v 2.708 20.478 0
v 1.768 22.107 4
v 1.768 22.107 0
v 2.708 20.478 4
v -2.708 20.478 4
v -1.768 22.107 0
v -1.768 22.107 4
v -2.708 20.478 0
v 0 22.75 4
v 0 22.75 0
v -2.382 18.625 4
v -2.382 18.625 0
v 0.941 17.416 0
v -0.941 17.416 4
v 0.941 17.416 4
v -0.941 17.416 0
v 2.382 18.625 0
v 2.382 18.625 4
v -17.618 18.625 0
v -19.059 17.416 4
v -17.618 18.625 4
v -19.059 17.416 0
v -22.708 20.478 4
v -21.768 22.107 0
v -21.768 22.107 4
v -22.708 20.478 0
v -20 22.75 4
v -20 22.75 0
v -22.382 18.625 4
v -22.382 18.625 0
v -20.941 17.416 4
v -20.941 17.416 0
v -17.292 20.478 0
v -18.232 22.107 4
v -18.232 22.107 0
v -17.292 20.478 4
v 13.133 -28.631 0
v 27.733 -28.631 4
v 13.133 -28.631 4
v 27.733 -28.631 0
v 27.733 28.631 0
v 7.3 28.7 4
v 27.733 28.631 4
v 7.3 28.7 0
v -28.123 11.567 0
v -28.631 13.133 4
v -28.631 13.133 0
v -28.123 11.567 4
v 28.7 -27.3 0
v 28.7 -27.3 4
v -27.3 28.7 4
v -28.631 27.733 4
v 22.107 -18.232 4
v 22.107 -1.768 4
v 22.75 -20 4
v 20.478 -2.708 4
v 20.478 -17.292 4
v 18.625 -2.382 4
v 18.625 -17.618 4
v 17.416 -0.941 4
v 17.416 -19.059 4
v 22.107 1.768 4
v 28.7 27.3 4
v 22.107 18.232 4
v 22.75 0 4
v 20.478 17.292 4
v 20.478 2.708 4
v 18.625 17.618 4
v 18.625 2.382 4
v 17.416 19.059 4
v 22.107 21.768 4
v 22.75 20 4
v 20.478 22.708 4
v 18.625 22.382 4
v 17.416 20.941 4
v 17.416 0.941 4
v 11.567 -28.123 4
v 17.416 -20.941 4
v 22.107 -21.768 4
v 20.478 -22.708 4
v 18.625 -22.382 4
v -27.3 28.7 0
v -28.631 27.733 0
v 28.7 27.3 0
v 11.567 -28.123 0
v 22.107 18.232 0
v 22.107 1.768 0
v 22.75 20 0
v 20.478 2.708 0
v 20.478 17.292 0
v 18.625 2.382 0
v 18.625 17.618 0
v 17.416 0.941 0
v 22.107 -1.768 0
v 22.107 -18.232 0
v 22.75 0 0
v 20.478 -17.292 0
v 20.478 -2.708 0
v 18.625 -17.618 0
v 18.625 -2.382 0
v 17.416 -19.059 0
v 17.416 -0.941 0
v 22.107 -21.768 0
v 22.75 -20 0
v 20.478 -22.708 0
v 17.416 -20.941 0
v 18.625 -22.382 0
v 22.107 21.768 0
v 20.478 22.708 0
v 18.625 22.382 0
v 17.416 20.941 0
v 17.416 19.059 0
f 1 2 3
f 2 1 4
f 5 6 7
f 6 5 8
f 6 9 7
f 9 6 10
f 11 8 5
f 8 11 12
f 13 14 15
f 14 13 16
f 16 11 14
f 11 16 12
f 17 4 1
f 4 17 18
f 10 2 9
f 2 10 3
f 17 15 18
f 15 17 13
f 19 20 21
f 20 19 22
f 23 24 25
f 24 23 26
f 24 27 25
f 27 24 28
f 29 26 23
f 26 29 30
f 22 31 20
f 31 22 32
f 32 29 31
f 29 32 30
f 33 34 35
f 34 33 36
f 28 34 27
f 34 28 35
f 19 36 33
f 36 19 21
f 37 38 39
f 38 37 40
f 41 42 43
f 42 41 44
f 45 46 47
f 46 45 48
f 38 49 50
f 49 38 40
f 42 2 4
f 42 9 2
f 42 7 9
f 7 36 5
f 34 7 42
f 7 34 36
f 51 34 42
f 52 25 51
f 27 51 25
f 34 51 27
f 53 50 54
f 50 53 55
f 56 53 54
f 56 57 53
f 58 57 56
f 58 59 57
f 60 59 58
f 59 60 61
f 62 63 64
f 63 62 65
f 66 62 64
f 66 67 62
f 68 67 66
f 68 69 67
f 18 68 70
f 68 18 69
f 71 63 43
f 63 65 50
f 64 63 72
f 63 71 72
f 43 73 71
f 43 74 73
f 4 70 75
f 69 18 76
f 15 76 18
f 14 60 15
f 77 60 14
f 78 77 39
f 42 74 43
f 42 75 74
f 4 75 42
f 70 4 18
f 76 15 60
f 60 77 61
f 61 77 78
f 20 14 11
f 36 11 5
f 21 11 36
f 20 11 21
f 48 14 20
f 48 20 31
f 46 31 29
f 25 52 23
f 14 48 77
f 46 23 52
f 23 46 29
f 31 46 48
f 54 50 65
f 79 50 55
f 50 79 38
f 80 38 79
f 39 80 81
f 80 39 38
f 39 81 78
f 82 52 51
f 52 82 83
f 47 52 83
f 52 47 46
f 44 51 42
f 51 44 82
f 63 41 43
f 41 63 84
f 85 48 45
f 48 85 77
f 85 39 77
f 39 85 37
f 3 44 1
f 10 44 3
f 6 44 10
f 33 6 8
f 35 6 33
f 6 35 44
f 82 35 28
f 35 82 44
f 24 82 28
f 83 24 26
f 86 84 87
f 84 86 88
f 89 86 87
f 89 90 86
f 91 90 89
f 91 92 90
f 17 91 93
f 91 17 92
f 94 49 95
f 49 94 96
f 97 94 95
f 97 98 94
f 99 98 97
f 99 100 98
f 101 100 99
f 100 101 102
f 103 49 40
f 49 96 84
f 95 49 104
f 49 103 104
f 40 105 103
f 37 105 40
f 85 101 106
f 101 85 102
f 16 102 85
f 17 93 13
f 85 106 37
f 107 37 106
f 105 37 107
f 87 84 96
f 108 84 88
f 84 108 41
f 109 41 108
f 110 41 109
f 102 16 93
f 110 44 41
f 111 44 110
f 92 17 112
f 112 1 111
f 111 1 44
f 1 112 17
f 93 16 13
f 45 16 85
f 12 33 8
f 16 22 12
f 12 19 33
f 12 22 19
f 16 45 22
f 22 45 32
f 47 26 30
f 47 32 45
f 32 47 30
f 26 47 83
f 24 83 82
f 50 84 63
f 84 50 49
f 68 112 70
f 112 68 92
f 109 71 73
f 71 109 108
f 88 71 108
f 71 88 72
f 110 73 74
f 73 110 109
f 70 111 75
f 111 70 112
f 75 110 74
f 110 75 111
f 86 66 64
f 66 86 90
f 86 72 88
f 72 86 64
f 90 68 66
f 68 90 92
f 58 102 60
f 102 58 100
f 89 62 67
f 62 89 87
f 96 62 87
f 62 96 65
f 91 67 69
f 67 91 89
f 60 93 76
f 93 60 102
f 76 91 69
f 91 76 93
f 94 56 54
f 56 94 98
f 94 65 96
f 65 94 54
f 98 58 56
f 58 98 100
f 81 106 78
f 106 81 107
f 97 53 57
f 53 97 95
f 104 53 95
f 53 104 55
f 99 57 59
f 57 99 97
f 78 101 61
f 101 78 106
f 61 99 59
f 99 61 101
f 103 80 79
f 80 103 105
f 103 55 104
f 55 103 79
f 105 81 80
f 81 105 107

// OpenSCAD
// rob@openpart.co.uk 20140202-02:02
// 5 hole 90 degree L joining plate for 20mm NOMINAL extrusion
// V-Slot & others

module roundedRect(size, radius) {
	x = size[0];
	y = size[1];
	z = size[2];
	linear_extrude(height=z)
	hull()
	{
		// place 4 circles in the corners, with the given radius
		translate([(-x/2)+(radius/2), (-y/2)+(radius/2), 0])
		circle(r=radius);
		translate([(x/2)-(radius/2), (-y/2)+(radius/2), 0])
		circle(r=radius);
		translate([(-x/2)+(radius/2), (y/2)-(radius/2), 0])
		circle(r=radius);
		translate([(x/2)-(radius/2), (y/2)-(radius/2), 0])
		circle(r=radius);
	}
}
angle = 90;
hole = 5.5 / 2;
plate_width1 = 36;
plate_width2 = 56;
plate_length = 16;
plate_thickness = 4;
extend_past_thickness = 2;
corner_radius = 1.4;
difference() {
	hull () {
		rotate([0,0,angle]) {
			translate([20, 10, 0])
				roundedRect ([plate_length, plate_width1, plate_thickness], corner_radius);
		}
		translate([20, 0, 0])
				roundedRect ([plate_length, plate_width2, plate_thickness], corner_radius);
		}
		translate([20,20,-1])
			cylinder(h = (extend_past_thickness+plate_thickness+2), r = hole);
		translate([20,0,-1])
			cylinder(h = (extend_past_thickness+plate_thickness+2), r = hole);
		translate([20,-20,-1])
				cylinder(h = (extend_past_thickness+plate_thickness+2), r = hole);

		rotate([0,0,angle]) {
			translate([20,0,-1])
				cylinder(h = (extend_past_thickness+plate_thickness+2), r = hole);
			translate([20,20,-1])
				cylinder(h = (extend_past_thickness+plate_thickness+2), r = hole);
			
		}
}
